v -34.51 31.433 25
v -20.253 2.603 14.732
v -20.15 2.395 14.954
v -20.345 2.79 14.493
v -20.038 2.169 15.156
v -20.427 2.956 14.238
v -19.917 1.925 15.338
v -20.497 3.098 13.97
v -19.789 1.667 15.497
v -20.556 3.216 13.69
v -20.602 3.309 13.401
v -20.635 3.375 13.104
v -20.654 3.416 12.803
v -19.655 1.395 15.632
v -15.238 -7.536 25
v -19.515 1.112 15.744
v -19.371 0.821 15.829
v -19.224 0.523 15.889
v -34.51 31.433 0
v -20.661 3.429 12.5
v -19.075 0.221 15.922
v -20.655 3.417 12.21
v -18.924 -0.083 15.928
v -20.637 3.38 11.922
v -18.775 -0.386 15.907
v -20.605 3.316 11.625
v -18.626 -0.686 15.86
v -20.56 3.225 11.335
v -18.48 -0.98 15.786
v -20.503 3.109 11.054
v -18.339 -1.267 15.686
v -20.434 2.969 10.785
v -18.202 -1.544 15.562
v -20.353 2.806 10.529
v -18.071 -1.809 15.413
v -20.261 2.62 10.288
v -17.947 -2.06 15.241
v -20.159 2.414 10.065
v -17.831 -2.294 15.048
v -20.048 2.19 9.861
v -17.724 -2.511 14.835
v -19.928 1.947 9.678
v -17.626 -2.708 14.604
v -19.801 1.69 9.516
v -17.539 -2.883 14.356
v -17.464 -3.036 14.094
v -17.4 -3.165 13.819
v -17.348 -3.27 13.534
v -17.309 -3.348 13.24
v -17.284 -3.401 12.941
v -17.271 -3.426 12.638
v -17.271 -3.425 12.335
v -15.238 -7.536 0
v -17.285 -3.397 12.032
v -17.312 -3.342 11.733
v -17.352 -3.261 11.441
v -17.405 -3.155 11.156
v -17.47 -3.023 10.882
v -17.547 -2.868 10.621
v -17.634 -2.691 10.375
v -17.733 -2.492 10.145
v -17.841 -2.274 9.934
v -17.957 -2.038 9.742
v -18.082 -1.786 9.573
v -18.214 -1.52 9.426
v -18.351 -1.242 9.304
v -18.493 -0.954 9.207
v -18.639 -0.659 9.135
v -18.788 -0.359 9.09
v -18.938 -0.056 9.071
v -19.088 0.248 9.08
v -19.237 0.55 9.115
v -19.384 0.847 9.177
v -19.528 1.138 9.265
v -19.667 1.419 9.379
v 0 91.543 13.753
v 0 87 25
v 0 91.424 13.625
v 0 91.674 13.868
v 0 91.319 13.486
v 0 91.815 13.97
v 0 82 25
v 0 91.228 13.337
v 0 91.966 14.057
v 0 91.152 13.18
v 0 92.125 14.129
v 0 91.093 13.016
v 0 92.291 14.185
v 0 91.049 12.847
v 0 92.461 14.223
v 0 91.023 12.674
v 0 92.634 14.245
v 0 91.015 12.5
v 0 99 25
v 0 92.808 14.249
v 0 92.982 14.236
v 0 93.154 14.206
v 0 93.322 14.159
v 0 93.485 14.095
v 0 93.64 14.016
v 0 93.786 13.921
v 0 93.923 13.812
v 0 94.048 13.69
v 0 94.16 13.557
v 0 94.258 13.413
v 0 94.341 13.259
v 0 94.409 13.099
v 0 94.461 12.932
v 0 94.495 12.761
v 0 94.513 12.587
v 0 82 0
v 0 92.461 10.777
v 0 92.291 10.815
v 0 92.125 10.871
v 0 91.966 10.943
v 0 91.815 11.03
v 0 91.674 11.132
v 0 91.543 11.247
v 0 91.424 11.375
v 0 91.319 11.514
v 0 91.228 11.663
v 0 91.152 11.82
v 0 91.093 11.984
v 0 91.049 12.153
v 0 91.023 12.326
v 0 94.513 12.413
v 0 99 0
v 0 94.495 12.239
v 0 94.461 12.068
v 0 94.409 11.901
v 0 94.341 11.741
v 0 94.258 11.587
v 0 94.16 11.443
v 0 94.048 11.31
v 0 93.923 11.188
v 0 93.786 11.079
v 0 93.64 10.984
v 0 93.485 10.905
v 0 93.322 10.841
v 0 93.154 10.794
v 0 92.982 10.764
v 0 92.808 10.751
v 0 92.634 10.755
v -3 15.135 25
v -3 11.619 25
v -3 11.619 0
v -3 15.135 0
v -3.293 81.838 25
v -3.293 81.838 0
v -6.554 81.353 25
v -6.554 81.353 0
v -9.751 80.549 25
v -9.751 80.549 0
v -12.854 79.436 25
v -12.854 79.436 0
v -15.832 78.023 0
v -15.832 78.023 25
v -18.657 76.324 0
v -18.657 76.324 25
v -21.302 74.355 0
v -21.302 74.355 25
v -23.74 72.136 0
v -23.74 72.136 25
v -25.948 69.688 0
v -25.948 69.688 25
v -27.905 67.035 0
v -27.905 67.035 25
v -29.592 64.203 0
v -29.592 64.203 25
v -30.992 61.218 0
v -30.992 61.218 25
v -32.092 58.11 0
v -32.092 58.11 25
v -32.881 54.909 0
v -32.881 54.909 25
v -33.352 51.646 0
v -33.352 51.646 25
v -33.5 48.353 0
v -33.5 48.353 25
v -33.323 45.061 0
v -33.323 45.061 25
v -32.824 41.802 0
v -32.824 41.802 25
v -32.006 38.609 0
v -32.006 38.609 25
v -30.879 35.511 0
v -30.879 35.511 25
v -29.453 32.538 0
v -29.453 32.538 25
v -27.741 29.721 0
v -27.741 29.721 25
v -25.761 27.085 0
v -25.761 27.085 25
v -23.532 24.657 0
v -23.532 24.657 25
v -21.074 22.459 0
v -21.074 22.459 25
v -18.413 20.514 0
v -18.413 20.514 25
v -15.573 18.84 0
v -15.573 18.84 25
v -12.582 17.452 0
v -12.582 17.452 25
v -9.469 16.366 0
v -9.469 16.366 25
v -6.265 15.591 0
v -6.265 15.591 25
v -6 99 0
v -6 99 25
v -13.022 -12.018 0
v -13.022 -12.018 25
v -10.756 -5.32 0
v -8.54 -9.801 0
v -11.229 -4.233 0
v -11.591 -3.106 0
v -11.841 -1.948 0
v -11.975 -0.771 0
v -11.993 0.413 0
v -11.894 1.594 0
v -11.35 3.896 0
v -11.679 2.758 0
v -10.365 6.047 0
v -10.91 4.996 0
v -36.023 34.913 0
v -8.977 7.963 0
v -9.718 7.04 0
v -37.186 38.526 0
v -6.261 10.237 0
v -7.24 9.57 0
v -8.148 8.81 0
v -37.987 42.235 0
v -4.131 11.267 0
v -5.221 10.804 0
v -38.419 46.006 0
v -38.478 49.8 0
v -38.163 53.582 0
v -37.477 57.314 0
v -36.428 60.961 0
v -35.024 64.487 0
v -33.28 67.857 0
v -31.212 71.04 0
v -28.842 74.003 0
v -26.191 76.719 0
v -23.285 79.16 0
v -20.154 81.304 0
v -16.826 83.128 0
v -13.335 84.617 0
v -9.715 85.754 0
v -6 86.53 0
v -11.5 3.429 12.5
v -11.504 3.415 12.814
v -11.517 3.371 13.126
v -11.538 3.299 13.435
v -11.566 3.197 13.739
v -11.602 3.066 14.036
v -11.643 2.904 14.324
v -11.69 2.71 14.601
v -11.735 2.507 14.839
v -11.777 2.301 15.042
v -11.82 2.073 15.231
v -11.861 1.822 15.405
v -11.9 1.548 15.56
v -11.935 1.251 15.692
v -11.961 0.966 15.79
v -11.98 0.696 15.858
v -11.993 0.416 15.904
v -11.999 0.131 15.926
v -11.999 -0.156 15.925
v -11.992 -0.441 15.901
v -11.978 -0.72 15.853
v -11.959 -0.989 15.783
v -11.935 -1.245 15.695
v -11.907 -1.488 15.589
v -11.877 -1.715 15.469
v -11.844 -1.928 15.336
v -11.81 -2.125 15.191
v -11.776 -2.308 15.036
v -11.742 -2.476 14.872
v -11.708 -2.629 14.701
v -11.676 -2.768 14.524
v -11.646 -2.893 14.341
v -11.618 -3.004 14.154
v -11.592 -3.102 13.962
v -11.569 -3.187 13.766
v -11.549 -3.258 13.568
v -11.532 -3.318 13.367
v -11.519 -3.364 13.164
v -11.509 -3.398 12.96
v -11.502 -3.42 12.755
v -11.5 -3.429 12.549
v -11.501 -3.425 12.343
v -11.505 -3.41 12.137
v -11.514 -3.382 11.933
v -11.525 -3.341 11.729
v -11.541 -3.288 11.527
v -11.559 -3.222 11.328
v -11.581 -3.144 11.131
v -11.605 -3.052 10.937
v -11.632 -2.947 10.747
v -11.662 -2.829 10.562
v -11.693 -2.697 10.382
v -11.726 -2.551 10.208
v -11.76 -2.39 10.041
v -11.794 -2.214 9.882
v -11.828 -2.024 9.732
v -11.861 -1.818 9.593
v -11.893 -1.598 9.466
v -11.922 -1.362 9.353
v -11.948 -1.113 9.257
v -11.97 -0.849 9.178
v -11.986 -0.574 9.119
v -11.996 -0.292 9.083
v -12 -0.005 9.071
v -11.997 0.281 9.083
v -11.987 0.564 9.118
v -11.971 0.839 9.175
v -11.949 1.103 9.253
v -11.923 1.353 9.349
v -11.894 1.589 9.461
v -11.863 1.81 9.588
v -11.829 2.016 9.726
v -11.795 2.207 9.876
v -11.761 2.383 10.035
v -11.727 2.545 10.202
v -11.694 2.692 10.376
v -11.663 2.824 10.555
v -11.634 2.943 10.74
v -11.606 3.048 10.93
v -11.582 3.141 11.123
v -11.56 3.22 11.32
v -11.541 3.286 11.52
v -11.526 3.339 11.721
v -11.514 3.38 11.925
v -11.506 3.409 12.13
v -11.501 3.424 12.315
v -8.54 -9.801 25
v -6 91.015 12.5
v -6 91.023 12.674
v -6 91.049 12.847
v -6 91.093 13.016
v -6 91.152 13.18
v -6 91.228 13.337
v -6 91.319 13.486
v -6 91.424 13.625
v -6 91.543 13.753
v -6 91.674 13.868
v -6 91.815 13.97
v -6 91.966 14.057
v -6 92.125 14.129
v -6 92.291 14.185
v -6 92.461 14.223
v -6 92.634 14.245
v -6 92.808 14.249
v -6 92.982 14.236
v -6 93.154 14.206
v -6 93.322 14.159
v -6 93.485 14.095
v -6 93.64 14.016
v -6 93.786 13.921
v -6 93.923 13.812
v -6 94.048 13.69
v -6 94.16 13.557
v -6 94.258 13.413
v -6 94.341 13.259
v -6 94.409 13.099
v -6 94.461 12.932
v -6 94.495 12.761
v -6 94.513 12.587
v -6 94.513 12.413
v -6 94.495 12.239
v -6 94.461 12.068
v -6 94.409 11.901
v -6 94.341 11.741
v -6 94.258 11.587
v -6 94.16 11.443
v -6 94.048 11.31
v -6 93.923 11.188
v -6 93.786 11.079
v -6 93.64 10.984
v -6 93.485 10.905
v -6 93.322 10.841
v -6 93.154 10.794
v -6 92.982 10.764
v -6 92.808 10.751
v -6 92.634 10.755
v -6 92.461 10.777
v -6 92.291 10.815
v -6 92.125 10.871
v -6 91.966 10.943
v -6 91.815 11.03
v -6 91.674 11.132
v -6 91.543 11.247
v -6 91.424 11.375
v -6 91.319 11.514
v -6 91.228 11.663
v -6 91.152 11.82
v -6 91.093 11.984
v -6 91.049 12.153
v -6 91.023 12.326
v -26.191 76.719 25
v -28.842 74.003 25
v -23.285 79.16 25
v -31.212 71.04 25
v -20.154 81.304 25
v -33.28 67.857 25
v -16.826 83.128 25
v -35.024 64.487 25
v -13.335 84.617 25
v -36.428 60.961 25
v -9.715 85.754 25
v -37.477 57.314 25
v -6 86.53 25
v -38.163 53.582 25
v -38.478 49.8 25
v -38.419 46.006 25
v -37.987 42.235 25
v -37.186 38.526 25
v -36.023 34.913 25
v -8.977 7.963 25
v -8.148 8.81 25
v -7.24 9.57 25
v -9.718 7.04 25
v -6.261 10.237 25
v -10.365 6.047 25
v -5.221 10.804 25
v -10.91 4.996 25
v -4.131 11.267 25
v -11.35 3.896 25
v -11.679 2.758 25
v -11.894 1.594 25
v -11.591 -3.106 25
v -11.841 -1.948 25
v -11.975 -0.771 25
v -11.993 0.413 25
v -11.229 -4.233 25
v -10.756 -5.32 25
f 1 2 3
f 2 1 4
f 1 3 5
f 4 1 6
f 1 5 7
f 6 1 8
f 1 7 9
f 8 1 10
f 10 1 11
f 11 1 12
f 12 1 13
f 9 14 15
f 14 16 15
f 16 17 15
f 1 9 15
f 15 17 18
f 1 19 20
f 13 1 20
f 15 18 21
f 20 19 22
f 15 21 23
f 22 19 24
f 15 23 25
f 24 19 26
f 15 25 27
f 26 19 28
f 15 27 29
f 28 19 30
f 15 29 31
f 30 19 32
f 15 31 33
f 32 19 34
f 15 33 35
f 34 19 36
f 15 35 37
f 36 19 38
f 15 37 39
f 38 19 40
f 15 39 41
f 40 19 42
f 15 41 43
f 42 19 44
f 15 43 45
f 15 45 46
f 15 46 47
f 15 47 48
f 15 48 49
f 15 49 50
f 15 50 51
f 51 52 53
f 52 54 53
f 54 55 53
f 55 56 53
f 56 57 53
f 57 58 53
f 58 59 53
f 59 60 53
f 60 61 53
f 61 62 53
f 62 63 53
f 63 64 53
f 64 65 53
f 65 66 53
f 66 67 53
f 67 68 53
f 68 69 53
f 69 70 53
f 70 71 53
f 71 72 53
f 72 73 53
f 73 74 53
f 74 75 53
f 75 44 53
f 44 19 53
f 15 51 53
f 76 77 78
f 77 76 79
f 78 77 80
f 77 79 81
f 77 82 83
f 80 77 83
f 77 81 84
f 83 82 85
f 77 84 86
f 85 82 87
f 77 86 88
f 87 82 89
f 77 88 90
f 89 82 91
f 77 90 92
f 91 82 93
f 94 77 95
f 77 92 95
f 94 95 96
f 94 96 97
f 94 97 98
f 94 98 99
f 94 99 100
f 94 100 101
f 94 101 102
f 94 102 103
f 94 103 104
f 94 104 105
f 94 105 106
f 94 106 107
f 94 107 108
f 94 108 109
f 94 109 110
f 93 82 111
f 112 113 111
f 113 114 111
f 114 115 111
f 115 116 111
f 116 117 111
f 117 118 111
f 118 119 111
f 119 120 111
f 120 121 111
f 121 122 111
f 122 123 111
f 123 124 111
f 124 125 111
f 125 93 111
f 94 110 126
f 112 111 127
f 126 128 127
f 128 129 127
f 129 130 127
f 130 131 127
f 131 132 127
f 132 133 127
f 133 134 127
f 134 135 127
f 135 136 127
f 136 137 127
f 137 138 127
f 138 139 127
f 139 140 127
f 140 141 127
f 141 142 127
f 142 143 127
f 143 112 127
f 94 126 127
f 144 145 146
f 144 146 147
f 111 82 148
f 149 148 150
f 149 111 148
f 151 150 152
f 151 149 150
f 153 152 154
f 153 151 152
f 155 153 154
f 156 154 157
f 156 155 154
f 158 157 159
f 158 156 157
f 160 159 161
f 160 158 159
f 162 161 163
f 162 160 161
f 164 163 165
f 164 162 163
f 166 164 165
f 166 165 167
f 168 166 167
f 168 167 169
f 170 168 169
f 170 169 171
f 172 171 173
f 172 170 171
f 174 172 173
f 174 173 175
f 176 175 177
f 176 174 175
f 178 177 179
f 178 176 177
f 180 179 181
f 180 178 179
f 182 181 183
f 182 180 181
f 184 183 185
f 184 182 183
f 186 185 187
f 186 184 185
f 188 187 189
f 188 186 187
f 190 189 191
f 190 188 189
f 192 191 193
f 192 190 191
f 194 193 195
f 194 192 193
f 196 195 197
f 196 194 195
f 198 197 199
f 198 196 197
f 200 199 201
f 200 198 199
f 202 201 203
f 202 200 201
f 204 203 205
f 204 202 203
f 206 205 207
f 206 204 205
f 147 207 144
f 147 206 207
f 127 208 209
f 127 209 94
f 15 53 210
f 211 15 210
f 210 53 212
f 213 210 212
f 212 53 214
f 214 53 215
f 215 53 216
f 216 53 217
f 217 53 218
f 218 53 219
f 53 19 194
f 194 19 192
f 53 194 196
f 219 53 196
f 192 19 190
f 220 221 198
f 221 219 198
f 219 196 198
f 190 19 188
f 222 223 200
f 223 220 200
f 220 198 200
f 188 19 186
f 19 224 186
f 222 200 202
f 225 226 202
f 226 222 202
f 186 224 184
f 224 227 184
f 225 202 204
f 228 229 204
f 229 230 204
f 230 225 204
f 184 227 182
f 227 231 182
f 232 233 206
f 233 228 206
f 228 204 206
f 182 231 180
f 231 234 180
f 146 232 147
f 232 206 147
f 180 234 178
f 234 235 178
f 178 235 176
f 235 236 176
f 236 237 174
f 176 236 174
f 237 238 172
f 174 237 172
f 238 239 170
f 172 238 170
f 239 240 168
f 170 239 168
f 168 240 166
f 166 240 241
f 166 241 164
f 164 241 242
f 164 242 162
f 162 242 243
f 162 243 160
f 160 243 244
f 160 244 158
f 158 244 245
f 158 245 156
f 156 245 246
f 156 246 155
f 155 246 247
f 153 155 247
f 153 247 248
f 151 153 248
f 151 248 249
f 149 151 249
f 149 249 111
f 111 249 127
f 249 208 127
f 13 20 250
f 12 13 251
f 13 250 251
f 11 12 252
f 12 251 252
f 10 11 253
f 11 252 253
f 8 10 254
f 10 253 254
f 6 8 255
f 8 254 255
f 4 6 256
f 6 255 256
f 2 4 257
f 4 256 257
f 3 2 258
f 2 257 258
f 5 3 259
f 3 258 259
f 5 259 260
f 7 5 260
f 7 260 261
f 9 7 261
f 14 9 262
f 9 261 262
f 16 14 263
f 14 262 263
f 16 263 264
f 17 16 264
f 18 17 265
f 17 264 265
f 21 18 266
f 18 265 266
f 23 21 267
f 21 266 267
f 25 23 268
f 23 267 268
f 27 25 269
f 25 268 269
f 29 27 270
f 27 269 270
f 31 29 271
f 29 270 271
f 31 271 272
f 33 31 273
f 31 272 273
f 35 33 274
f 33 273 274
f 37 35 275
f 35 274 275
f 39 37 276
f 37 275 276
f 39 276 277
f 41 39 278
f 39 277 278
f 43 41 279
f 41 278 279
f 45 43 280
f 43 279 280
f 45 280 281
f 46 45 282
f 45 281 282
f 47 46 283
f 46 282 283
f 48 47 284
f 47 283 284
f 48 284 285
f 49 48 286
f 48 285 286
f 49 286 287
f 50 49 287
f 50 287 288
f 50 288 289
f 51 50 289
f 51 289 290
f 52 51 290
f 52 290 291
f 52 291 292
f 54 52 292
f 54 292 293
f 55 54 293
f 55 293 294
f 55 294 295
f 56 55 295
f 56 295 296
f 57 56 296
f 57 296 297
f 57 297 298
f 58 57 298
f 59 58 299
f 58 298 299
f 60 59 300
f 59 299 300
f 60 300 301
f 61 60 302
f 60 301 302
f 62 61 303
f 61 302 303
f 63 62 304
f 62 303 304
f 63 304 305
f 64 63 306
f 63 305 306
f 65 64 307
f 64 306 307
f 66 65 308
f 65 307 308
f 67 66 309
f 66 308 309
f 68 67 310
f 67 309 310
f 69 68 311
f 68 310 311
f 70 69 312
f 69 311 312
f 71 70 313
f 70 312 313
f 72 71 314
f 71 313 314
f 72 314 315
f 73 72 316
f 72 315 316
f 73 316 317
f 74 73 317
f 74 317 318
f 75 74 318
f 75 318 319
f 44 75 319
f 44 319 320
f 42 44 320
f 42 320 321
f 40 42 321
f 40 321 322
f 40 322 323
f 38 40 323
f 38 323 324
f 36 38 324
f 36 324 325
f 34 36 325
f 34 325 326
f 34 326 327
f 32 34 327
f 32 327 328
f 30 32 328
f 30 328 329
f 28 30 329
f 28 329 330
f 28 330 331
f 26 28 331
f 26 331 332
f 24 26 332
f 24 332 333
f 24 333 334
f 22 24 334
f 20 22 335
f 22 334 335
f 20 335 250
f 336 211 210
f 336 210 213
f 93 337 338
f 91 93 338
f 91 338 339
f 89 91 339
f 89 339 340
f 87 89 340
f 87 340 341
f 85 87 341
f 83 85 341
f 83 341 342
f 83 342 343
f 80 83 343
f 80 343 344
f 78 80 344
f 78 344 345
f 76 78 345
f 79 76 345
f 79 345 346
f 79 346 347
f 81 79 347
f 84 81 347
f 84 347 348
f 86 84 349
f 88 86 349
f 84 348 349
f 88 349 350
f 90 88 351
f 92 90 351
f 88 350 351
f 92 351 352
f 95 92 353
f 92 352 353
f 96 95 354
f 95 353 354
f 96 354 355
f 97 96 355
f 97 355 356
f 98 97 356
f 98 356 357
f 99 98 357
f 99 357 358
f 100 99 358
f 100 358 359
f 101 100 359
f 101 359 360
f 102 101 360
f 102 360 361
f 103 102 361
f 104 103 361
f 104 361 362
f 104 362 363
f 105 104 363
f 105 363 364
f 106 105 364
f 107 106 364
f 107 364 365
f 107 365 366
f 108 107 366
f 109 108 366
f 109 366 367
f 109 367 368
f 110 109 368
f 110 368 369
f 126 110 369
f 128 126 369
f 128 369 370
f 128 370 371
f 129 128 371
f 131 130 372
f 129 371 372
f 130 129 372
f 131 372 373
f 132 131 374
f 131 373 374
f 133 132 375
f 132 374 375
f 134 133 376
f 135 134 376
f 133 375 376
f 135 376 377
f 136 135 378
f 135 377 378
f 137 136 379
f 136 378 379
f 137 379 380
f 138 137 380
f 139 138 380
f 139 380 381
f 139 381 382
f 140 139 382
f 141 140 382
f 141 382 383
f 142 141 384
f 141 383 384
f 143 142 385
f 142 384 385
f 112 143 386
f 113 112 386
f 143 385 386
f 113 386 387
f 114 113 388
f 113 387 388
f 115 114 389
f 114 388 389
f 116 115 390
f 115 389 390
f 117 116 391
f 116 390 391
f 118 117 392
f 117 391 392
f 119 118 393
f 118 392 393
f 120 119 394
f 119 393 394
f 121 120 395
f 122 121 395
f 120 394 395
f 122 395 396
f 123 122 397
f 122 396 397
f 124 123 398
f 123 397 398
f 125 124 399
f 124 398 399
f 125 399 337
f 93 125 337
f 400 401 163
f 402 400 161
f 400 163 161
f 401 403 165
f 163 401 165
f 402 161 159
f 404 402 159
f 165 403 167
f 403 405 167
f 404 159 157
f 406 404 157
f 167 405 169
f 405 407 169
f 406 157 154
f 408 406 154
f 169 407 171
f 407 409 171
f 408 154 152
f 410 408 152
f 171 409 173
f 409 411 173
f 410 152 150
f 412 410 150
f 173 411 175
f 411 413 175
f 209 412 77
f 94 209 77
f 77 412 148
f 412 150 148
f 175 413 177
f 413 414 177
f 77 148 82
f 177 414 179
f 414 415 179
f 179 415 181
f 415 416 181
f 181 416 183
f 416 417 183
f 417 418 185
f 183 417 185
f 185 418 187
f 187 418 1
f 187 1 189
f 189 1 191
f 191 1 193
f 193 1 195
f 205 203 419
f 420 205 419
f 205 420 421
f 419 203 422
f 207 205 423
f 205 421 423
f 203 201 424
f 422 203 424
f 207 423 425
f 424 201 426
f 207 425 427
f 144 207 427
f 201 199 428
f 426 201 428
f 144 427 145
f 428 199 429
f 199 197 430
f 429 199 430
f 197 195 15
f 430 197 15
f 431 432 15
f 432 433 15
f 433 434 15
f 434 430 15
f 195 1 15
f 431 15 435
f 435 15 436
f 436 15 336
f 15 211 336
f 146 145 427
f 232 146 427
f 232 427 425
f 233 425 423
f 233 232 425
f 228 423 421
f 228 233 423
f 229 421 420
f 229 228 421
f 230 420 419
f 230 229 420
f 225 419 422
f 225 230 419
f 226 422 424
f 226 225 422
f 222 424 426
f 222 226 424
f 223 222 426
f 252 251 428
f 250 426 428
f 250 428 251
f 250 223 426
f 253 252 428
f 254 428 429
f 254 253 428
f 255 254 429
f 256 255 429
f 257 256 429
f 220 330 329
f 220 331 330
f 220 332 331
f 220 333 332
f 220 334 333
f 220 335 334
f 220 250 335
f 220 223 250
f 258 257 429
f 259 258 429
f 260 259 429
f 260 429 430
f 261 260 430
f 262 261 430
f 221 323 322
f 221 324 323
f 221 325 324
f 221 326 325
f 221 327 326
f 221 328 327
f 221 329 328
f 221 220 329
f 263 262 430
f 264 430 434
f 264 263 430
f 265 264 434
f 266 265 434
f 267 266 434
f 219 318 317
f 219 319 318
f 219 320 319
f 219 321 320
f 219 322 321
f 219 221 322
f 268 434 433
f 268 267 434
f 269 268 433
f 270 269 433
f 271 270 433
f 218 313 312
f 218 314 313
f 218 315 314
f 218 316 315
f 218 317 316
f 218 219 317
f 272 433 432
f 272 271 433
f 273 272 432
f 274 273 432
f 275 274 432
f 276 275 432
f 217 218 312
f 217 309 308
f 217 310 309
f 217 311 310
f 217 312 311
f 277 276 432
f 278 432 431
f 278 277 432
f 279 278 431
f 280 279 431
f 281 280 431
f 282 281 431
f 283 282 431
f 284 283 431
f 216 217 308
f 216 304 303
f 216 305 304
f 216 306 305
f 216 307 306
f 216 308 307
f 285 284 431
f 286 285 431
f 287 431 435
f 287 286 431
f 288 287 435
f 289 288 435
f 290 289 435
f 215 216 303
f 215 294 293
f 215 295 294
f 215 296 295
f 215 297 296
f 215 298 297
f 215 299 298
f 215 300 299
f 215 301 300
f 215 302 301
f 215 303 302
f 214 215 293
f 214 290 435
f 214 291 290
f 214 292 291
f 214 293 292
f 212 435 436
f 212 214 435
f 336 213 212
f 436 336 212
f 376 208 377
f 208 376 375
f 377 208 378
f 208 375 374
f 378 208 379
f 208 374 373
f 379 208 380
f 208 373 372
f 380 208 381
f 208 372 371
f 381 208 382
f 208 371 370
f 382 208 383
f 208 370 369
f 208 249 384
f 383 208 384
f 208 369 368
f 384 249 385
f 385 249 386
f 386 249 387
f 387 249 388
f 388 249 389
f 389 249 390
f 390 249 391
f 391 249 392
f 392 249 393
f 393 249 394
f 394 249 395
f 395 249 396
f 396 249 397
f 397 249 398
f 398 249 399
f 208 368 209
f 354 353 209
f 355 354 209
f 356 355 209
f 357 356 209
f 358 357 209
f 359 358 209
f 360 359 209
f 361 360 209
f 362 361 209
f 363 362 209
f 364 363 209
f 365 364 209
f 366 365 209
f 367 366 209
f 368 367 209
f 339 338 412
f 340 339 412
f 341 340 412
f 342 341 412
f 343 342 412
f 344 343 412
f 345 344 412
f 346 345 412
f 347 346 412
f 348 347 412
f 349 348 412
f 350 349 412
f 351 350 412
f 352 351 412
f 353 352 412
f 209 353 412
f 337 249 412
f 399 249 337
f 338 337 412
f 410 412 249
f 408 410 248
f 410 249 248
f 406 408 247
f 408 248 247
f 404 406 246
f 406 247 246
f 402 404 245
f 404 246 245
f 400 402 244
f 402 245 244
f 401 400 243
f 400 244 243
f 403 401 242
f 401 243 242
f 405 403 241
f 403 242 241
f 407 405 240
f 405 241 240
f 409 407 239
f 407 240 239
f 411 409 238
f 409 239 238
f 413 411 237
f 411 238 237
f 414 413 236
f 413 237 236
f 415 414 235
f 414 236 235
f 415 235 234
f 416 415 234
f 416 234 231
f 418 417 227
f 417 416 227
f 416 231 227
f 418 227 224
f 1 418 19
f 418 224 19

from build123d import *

# Parameters (mm, degrees)
F0_R      = 12
F0_R_2    = 33.5
F1_DEPTH  = 50
F4_DEPTH  = 25
F5_W      = 12
F5_H      = 25
F6_DEPTH  = 1
F7_DEPTH  = 12
F8_R      = 3.429
F9_DEPTH  = 30
F10_R     = 1.75
F11_DEPTH = 25
F12_W     = 6
F12_H     = 8.7619052733
F13_DEPTH = 55
F15_DEPTH = 52
F17_DEPTH = 50
F18_W     = 81.3058614731
F18_H     = 161.7973074317
F19_DEPTH = 50
F20_W     = 42.0657843351
F20_H     = 29.0236644447
F21_DEPTH = 250


with BuildPart() as f1:
    # F0 (on Top) → F1 (new body)
    with BuildSketch(Plane.XY):
        with BuildLine():
            ThreePointArc((34.510392045, 31.4329896907), (0, 87), (-34.510392045, 31.4329896907))
            Line((-34.510392045, 31.4329896907), (-15.238354929, -7.5360824742))
            ThreePointArc((-15.238354929, -7.5360824742), (0, -17), (15.238354929, -7.5360824742))
            Line((15.238354929, -7.5360824742), (34.510392045, 31.4329896907))
        make_face()
        Circle(F0_R, mode=Mode.SUBTRACT)
        with Locations((0, 48.5)):
            Circle(F0_R_2, mode=Mode.SUBTRACT)
    extrude(amount=F1_DEPTH)

    # F3 (on offset) → F4 (cut)
    with BuildSketch(Plane.XZ.offset(-87)):
        with BuildLine():
            add(Edge.make_bspline(
                [(17.5, 50), (17.5, 73), (0, 73), (-17.5, 73), (-17.5, 50)],
                knots=[1.5707963268, 1.5707963268, 1.5707963268, 3.1415926536, 3.1415926536, 4.7123889804, 4.7123889804, 4.7123889804], degree=2, weights=[1, 0.7071067812, 1, 0.7071067812, 1]))
            Line((-17.5, 50), (17.5, 50))
        make_face()
        with BuildLine():
            Line((17.5, 50), (-17.5, 50))
            add(Edge.make_bspline(
                [(-17.5, 50), (-17.5, 27), (0, 27)],
                knots=[4.7123889804, 4.7123889804, 4.7123889804, 6.2831853072, 6.2831853072, 6.2831853072], degree=2, weights=[1, 0.7071067812, 1]))
            add(Edge.make_bspline(
                [(0, 27), (17.5, 27), (17.5, 50)],
                knots=[0, 0, 0, 1.5707963268, 1.5707963268, 1.5707963268], degree=2, weights=[1, 0.7071067812, 1]))
        make_face()
    extrude(amount=F4_DEPTH, mode=Mode.SUBTRACT)

    # F5 (on offset) → F6 (join)
    with BuildSketch(Plane.XZ.offset(-87)):
        with Locations((0, 12.5)):
            Rectangle(F5_W, F5_H)
    extrude(amount=F6_DEPTH)

    # F5 (on offset) → F7 (join)
    with BuildSketch(Plane.XZ.offset(-87)):
        with Locations((0, 12.5)):
            Rectangle(F5_W, F5_H)
    extrude(amount=-F7_DEPTH)

    # F8 (on Right) → F9 (cut, symmetric)
    with BuildSketch(Plane.YZ):
        with Locations((0, 12.5)):
            Circle(F8_R)
    extrude(amount=F9_DEPTH, both=True, mode=Mode.SUBTRACT)

    # F10 (on face) → F11 (cut)
    with BuildSketch(Plane(origin=(-6, 0, 0), x_dir=(0, -1, 0), z_dir=(-1, 0, 0))):
        with Locations((-92.7647968698, 12.5)):
            Circle(F10_R)
    extrude(amount=-F11_DEPTH, mode=Mode.SUBTRACT)

    # F12 (on face) → F13 (cut)
    with BuildSketch(Plane.XY.offset(50)):
        with Locations((0, 13.4115335532)):
            Rectangle(F12_W, F12_H)
    extrude(amount=-F13_DEPTH, mode=Mode.SUBTRACT)

    # F14 (on face) → F15 (cut)
    with BuildSketch(Plane.XY.offset(50)):
        with BuildLine():
            ThreePointArc((10.7564858322, -5.3195876289), (0, -12), (-10.7564858322, -5.3195876289))
            Line((-10.7564858322, -5.3195876289), (-15.238354929, -7.5360824742))
            ThreePointArc((-15.238354929, -7.5360824742), (0, -17), (15.238354929, -7.5360824742))
            Line((15.238354929, -7.5360824742), (10.7564858322, -5.3195876289))
        make_face()
    extrude(amount=-F15_DEPTH, mode=Mode.SUBTRACT)

    # F16 (on Top) → F17 (join)
    with BuildSketch(Plane.XY):
        Polygon((-10.7564858322, -5.3195876289), (-15.238354929, -7.5360824742), (-13.0218600836, -12.017951571), (-8.5399909869, -9.8014567256), align=None)
        Polygon((13.0218600836, -12.017951571), (15.238354929, -7.5360824742), (10.7564858322, -5.3195876289), (8.5399909869, -9.8014567256), align=None)
    extrude(amount=F17_DEPTH)

    # F18 (on Top) → F19 (cut)
    with BuildSketch(Plane.XY):
        with Locations((40.6529307365, 33.7636955082)):
            Rectangle(F18_W, F18_H)
    extrude(amount=F19_DEPTH, mode=Mode.SUBTRACT)

    # F20 (on Front) → F21 (cut, symmetric)
    with BuildSketch(Plane.XZ):
        with Locations((-21.0328921676, 39.5118322223)):
            Rectangle(F20_W, F20_H)
    extrude(amount=F21_DEPTH, both=True, mode=Mode.SUBTRACT)


solid = f1.part
